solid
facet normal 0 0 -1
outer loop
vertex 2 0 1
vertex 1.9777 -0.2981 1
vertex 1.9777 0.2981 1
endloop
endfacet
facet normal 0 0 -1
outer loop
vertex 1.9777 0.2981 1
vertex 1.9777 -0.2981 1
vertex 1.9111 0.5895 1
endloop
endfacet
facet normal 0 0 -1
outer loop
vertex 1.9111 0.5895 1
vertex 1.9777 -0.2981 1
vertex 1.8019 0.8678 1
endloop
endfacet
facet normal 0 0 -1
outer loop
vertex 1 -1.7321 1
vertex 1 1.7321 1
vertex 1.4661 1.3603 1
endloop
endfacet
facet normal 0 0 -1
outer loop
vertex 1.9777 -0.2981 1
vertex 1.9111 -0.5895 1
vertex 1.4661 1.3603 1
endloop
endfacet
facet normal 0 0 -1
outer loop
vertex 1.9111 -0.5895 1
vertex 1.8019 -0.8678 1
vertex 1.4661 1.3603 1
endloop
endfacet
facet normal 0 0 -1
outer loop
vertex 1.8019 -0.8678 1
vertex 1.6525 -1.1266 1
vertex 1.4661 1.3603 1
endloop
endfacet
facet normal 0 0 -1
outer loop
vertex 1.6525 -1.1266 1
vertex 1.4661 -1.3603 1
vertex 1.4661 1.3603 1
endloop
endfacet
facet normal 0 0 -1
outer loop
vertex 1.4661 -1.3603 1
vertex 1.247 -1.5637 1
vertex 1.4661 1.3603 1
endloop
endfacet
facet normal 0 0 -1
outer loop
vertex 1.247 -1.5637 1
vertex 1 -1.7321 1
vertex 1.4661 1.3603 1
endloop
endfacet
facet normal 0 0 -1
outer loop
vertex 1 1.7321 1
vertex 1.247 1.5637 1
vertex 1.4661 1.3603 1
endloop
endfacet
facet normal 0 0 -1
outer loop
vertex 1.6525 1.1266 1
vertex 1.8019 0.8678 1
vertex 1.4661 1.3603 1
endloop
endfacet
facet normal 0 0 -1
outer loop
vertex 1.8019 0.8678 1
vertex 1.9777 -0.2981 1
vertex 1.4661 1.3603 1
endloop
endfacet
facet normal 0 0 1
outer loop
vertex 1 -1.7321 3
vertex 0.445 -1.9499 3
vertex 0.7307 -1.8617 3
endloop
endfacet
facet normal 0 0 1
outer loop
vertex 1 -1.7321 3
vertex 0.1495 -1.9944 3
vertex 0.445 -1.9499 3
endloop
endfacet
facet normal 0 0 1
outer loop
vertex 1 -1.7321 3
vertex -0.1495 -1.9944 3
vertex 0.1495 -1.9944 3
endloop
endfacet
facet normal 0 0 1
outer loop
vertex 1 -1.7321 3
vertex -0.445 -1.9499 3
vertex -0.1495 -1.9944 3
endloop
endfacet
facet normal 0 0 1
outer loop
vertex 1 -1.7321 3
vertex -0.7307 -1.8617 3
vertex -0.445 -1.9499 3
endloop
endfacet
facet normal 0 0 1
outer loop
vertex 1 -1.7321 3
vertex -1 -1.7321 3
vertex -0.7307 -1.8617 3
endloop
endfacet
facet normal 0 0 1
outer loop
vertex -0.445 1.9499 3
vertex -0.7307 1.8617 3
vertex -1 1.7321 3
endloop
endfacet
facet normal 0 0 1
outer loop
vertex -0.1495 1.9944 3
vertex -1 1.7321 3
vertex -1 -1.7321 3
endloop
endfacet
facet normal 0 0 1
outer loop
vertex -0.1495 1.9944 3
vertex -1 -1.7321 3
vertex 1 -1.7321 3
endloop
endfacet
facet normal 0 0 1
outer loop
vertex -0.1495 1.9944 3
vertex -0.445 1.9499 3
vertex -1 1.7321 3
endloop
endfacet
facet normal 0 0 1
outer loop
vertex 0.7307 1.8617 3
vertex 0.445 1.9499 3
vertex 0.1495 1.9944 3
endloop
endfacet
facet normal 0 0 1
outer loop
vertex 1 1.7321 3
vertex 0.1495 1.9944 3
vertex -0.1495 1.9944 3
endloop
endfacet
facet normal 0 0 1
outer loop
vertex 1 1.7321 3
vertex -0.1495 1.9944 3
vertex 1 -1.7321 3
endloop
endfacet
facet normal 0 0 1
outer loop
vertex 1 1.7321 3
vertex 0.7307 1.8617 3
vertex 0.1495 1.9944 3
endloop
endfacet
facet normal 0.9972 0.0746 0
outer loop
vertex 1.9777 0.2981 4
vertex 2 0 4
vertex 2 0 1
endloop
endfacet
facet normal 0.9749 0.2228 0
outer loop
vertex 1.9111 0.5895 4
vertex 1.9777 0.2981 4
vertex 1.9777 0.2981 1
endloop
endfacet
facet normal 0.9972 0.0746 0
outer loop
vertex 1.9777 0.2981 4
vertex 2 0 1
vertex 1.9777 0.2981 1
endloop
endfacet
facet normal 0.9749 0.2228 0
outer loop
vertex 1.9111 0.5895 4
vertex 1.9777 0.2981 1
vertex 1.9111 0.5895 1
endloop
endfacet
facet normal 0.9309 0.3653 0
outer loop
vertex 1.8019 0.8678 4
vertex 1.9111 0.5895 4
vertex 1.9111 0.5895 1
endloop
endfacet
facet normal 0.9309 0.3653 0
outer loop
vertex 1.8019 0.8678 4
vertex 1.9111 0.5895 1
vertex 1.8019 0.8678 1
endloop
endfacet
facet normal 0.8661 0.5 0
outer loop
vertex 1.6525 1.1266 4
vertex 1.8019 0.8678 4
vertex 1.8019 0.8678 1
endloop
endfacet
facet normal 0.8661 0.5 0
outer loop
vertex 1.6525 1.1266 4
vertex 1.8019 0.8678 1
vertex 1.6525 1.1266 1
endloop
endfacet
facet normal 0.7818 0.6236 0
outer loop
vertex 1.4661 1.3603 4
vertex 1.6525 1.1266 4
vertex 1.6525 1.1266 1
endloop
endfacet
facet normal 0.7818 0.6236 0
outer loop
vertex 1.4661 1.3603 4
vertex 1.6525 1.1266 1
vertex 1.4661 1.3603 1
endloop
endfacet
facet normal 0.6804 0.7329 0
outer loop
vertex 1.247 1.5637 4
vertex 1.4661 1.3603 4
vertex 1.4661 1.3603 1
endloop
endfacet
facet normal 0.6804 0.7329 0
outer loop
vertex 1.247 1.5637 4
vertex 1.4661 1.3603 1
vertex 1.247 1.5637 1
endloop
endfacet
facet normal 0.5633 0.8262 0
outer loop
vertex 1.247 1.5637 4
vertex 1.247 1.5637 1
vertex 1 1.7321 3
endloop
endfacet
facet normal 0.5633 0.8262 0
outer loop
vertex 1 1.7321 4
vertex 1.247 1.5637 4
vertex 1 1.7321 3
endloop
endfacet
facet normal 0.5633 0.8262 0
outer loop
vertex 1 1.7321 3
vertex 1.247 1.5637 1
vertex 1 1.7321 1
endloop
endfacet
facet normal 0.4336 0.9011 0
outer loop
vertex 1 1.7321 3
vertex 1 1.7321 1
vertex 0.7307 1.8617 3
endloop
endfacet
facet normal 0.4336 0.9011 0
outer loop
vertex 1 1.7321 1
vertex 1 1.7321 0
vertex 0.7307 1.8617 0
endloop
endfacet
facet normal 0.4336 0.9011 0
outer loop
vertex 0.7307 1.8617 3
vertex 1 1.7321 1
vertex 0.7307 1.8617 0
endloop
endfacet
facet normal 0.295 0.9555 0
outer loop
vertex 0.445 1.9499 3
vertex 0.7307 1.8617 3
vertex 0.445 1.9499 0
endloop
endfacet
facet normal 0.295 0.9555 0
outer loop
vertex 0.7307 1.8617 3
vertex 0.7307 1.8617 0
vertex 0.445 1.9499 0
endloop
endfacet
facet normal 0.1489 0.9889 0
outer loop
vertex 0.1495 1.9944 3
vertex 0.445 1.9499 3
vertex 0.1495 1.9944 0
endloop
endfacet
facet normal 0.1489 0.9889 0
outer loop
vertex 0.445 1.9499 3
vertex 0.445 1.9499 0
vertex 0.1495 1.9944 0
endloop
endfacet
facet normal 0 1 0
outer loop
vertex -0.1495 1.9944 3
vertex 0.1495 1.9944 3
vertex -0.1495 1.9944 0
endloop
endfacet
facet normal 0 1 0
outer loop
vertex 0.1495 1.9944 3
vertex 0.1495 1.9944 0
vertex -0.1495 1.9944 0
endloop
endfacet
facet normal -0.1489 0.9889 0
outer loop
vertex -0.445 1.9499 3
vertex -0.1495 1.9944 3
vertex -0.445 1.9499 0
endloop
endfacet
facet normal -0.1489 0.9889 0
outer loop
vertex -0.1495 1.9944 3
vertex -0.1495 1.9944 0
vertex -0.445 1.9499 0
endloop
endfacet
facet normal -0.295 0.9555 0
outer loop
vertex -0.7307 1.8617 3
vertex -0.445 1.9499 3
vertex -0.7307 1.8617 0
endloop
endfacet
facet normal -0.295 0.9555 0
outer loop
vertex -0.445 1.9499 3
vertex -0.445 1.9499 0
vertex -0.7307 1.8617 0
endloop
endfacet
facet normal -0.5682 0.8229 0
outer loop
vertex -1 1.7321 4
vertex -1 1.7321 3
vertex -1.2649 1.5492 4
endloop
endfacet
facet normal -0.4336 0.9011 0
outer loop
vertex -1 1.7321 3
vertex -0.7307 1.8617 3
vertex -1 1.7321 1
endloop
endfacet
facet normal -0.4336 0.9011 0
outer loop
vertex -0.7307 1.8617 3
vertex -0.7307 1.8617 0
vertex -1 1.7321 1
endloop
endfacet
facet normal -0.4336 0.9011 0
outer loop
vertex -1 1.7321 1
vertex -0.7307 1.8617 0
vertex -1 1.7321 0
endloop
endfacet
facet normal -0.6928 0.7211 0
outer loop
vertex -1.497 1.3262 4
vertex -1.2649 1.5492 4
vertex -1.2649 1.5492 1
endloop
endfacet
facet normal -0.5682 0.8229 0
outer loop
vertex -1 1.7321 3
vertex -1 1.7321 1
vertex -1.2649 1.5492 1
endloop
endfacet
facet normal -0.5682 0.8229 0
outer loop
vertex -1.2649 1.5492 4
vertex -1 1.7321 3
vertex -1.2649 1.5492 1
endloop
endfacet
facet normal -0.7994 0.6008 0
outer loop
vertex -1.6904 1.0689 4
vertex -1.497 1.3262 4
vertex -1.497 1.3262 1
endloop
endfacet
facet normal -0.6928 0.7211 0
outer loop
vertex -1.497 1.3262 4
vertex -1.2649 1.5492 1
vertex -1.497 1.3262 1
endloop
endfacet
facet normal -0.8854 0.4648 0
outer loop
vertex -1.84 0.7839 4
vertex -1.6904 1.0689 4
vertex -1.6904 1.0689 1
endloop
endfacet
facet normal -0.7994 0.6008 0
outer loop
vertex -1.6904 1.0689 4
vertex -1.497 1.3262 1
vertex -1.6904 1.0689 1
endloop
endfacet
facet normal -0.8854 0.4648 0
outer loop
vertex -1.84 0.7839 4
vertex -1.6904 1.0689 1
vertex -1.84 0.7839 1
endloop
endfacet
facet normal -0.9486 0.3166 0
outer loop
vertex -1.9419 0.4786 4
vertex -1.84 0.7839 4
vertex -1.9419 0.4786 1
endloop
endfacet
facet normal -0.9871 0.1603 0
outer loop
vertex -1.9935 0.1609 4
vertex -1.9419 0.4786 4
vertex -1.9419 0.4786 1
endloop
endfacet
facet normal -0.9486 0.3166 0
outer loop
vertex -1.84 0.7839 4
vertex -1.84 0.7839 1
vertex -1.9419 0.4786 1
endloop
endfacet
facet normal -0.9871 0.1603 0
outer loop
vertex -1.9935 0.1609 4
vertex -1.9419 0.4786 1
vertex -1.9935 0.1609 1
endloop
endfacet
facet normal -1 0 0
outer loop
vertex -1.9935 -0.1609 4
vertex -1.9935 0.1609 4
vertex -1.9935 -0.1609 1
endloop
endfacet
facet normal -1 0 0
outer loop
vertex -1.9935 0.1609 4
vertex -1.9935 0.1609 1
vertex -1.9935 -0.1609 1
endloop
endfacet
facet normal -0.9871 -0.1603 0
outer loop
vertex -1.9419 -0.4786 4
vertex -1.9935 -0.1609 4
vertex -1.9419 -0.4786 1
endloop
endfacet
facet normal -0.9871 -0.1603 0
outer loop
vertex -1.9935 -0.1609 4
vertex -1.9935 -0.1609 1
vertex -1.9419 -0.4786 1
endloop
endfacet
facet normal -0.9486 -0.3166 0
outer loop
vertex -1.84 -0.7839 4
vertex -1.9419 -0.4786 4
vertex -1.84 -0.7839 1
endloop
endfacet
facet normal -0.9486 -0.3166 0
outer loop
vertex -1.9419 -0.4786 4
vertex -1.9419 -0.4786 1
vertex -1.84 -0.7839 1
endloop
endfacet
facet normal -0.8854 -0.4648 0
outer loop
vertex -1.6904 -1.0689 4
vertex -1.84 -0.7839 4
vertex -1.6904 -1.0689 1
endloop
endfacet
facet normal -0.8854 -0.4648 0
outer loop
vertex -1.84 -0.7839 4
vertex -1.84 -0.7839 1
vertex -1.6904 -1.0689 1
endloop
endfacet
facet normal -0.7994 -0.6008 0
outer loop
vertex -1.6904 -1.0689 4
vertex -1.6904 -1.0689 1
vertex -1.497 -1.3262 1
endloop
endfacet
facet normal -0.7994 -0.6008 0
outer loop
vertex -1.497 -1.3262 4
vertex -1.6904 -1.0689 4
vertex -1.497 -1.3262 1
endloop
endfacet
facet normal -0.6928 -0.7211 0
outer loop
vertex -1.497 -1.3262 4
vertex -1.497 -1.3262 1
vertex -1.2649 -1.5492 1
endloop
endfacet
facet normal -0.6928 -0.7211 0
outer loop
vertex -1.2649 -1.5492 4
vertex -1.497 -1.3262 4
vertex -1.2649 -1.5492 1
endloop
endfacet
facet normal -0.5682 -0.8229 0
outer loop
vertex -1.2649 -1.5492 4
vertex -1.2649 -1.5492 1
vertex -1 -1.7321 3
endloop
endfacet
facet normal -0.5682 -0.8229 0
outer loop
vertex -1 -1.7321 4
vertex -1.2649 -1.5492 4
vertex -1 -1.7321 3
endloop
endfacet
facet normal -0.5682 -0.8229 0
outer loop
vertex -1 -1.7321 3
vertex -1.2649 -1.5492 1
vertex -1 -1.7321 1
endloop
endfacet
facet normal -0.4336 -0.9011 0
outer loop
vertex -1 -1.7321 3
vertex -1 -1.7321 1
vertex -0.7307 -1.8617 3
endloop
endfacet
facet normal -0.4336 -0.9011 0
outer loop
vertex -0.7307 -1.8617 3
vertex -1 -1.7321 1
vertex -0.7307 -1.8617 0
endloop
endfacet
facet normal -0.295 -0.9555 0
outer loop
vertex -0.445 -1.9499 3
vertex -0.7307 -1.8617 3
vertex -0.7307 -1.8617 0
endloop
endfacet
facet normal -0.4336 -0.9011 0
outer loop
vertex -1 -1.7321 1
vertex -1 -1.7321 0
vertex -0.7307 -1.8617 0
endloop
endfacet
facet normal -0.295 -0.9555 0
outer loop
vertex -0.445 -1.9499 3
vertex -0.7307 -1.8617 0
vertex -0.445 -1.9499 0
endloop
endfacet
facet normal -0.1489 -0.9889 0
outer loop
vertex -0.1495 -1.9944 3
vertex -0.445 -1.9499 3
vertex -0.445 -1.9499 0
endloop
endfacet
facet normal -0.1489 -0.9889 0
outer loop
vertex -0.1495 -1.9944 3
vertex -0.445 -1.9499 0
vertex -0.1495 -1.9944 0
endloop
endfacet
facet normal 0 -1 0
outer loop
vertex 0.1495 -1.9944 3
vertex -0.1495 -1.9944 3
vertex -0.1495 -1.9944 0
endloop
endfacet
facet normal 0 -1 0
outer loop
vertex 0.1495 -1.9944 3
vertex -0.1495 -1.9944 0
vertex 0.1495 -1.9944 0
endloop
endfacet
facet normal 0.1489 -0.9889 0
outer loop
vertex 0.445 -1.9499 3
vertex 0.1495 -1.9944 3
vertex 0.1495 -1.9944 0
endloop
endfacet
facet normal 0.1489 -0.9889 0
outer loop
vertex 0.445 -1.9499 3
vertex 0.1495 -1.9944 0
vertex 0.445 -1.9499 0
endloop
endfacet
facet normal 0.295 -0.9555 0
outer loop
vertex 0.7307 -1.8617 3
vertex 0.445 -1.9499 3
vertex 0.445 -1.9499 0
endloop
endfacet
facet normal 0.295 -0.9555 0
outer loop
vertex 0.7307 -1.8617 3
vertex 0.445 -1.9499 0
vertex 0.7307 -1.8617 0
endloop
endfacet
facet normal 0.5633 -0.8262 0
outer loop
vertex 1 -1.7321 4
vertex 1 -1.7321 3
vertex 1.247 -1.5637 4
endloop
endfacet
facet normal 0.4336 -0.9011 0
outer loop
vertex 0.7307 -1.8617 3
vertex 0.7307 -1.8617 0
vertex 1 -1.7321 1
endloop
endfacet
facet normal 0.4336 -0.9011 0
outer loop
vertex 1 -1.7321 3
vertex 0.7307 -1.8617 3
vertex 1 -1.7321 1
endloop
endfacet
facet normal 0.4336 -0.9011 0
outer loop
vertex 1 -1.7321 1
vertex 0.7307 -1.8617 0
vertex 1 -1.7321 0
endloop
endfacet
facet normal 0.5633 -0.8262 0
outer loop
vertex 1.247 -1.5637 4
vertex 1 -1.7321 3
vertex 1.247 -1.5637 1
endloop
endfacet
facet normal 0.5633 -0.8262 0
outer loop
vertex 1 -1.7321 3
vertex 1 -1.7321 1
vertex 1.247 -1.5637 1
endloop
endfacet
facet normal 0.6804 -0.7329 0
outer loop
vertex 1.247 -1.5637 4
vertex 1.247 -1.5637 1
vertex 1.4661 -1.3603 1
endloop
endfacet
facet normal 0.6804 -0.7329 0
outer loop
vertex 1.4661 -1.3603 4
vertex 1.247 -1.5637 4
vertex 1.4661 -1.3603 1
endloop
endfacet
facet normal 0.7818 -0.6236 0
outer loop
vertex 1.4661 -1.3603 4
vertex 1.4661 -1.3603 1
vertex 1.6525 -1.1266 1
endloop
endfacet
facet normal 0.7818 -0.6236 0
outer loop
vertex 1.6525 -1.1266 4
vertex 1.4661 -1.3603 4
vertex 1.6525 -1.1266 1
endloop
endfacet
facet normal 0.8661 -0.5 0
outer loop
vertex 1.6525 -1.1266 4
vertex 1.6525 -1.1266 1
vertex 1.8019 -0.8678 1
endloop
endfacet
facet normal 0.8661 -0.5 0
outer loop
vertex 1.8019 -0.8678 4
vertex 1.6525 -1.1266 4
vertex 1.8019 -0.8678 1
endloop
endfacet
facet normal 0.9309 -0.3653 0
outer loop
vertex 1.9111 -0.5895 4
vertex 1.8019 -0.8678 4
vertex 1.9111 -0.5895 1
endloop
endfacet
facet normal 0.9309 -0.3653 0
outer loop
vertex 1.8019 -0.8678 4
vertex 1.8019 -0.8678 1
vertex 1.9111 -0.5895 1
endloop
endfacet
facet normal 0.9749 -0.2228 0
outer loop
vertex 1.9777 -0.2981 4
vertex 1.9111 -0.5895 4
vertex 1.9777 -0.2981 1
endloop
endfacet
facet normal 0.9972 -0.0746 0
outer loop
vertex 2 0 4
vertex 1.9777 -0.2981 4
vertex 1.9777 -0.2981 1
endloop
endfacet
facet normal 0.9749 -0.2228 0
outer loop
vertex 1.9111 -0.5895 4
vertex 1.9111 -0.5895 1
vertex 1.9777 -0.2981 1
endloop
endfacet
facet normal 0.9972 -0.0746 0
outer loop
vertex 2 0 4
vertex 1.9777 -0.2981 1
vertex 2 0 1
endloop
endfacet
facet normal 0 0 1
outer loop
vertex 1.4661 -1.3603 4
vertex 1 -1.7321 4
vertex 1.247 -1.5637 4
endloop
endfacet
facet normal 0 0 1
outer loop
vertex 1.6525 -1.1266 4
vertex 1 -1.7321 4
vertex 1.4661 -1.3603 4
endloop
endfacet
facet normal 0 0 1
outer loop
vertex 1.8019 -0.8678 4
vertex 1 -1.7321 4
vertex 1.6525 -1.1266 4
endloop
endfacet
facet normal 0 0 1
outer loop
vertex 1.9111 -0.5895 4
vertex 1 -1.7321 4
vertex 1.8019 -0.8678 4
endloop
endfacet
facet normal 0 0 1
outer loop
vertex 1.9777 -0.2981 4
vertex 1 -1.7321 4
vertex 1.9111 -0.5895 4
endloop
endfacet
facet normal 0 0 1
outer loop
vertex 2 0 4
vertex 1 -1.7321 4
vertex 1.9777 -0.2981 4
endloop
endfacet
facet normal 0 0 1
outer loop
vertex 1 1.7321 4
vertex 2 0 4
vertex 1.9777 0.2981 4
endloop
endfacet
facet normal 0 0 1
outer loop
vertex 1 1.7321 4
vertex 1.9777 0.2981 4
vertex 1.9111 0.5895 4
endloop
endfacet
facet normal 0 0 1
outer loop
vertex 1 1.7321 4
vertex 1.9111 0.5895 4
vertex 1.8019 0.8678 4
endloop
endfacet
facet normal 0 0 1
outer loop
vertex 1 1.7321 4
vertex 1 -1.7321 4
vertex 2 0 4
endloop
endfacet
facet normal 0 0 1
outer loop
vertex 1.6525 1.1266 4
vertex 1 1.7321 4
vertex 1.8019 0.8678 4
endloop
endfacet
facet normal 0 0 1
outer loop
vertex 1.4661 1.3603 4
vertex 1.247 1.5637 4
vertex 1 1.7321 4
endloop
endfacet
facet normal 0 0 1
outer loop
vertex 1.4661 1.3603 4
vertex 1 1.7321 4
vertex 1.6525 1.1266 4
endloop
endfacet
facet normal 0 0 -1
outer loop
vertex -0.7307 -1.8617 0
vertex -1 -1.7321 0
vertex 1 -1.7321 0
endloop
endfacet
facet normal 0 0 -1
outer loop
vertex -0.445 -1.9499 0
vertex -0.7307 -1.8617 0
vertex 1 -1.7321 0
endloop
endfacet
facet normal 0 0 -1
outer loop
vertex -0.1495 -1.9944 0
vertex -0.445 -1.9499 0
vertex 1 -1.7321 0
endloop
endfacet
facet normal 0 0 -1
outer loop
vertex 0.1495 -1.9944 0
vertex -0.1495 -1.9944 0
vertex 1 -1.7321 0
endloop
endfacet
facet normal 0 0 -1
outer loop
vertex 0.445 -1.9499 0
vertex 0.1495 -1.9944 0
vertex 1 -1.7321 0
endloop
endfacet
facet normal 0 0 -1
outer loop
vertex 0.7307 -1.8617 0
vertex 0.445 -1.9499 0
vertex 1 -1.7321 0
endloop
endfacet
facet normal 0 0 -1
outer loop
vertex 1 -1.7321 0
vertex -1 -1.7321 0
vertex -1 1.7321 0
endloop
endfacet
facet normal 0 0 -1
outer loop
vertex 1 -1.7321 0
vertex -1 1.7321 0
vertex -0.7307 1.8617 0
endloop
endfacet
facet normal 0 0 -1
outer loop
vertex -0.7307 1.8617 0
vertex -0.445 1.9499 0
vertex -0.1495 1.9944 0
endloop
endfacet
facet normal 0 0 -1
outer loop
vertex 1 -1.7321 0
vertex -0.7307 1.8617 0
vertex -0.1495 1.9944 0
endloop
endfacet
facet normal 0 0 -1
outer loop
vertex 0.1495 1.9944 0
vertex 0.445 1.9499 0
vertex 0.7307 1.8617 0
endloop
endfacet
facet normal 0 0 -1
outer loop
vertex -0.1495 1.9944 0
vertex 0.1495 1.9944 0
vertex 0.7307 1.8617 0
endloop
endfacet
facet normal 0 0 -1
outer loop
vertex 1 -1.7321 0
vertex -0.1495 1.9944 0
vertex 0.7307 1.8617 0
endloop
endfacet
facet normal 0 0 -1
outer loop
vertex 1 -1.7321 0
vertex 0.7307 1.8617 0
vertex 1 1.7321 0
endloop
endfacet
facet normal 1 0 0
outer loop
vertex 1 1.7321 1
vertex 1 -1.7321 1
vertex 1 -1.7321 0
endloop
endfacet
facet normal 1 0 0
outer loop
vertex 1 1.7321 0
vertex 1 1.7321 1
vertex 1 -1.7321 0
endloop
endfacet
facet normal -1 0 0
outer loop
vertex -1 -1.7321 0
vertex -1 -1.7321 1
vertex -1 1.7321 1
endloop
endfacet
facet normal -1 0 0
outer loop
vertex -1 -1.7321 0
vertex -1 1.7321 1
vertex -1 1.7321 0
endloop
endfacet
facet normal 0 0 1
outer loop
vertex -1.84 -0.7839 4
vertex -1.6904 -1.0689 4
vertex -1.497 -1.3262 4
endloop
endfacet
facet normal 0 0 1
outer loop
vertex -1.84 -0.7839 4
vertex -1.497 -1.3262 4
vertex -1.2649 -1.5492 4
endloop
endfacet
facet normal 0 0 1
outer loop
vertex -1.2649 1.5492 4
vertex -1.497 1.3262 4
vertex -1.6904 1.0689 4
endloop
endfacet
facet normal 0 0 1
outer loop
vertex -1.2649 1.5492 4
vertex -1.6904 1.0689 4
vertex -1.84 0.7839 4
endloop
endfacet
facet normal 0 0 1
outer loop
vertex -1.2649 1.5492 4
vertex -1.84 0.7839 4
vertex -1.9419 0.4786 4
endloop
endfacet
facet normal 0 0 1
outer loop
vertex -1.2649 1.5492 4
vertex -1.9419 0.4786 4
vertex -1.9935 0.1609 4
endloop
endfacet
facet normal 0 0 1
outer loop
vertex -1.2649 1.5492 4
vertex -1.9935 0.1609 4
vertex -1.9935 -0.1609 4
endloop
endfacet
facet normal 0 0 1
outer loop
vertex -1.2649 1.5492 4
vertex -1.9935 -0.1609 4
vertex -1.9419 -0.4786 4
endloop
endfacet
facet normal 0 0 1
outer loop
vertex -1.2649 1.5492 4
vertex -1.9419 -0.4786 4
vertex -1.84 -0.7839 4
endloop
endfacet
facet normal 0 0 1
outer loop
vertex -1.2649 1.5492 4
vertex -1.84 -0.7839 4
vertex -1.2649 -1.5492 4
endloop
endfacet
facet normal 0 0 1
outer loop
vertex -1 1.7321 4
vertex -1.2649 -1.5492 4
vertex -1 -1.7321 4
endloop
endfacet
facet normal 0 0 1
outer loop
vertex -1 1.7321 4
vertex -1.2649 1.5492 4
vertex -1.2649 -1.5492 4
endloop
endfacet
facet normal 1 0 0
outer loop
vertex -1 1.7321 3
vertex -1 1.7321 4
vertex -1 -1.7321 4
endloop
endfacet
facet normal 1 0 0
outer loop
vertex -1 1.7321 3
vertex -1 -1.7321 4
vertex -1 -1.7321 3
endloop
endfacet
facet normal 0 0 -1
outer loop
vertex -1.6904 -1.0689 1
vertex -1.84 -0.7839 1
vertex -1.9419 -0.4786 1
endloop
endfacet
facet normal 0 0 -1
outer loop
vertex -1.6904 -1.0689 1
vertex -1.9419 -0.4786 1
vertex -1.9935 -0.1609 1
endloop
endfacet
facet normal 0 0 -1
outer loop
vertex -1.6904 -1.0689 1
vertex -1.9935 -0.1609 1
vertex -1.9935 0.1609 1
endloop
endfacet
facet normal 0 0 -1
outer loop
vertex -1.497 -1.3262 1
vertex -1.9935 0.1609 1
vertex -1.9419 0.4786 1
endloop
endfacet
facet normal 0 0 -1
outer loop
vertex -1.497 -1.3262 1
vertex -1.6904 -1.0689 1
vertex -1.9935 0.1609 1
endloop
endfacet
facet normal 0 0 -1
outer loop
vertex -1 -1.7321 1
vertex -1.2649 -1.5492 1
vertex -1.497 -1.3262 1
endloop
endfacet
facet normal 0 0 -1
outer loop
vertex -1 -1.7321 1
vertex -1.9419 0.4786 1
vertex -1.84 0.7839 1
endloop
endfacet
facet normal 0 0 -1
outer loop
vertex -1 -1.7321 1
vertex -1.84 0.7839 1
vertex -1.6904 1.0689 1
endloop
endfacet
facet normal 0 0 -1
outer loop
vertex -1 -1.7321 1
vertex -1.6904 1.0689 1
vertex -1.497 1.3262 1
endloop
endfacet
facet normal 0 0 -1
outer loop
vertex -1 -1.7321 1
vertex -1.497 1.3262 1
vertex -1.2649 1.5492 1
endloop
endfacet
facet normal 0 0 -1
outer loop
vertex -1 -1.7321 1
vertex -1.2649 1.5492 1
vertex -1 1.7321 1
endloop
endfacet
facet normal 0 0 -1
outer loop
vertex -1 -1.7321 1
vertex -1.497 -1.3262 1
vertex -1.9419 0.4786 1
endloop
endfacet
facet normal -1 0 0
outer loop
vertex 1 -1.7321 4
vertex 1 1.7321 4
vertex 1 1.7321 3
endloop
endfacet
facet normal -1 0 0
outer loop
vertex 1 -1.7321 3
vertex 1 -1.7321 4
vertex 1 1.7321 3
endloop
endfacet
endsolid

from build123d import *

# Parameters (mm, degrees)
SKETCH1_R           = 2
BOSS_EXTRUDE1_DEPTH = 4
SKETCH2_W           = 2
SKETCH2_H           = 1
CUT_EXTRUDE1_DEPTH  = 5
SKETCH3_W           = 1
SKETCH3_H           = 1
CUT_EXTRUDE2_DEPTH  = 5


with BuildPart() as part:
    # Sketch1 → Boss-Extrude1 (new body)
    with BuildSketch(Plane.XY):
        Circle(SKETCH1_R)
    extrude(amount=BOSS_EXTRUDE1_DEPTH)

    # Sketch2 → Cut-Extrude1 (cut, symmetric)
    with BuildSketch(Plane(origin=(0, 0, 0), x_dir=(1, 0, 0), z_dir=(0, 1, 0))):
        Polygon((-2.31386892, -1), (-1, -1), (-1, 0.234035397), (-2.586760402, 0.199881392), align=None)
        with Locations((0, -3.5)):
            Rectangle(SKETCH2_W, SKETCH2_H)
    extrude(amount=CUT_EXTRUDE1_DEPTH, both=True, mode=Mode.SUBTRACT)

    # Sketch3 → Cut-Extrude2 (cut, symmetric)
    with BuildSketch(Plane(origin=(0, 0, 0), x_dir=(1, 0, 0), z_dir=(0, 1, 0))):
        with Locations((1.5, -0.5)):
            Rectangle(SKETCH3_W, SKETCH3_H)
    extrude(amount=CUT_EXTRUDE2_DEPTH, both=True, mode=Mode.SUBTRACT)


solid = part.part
